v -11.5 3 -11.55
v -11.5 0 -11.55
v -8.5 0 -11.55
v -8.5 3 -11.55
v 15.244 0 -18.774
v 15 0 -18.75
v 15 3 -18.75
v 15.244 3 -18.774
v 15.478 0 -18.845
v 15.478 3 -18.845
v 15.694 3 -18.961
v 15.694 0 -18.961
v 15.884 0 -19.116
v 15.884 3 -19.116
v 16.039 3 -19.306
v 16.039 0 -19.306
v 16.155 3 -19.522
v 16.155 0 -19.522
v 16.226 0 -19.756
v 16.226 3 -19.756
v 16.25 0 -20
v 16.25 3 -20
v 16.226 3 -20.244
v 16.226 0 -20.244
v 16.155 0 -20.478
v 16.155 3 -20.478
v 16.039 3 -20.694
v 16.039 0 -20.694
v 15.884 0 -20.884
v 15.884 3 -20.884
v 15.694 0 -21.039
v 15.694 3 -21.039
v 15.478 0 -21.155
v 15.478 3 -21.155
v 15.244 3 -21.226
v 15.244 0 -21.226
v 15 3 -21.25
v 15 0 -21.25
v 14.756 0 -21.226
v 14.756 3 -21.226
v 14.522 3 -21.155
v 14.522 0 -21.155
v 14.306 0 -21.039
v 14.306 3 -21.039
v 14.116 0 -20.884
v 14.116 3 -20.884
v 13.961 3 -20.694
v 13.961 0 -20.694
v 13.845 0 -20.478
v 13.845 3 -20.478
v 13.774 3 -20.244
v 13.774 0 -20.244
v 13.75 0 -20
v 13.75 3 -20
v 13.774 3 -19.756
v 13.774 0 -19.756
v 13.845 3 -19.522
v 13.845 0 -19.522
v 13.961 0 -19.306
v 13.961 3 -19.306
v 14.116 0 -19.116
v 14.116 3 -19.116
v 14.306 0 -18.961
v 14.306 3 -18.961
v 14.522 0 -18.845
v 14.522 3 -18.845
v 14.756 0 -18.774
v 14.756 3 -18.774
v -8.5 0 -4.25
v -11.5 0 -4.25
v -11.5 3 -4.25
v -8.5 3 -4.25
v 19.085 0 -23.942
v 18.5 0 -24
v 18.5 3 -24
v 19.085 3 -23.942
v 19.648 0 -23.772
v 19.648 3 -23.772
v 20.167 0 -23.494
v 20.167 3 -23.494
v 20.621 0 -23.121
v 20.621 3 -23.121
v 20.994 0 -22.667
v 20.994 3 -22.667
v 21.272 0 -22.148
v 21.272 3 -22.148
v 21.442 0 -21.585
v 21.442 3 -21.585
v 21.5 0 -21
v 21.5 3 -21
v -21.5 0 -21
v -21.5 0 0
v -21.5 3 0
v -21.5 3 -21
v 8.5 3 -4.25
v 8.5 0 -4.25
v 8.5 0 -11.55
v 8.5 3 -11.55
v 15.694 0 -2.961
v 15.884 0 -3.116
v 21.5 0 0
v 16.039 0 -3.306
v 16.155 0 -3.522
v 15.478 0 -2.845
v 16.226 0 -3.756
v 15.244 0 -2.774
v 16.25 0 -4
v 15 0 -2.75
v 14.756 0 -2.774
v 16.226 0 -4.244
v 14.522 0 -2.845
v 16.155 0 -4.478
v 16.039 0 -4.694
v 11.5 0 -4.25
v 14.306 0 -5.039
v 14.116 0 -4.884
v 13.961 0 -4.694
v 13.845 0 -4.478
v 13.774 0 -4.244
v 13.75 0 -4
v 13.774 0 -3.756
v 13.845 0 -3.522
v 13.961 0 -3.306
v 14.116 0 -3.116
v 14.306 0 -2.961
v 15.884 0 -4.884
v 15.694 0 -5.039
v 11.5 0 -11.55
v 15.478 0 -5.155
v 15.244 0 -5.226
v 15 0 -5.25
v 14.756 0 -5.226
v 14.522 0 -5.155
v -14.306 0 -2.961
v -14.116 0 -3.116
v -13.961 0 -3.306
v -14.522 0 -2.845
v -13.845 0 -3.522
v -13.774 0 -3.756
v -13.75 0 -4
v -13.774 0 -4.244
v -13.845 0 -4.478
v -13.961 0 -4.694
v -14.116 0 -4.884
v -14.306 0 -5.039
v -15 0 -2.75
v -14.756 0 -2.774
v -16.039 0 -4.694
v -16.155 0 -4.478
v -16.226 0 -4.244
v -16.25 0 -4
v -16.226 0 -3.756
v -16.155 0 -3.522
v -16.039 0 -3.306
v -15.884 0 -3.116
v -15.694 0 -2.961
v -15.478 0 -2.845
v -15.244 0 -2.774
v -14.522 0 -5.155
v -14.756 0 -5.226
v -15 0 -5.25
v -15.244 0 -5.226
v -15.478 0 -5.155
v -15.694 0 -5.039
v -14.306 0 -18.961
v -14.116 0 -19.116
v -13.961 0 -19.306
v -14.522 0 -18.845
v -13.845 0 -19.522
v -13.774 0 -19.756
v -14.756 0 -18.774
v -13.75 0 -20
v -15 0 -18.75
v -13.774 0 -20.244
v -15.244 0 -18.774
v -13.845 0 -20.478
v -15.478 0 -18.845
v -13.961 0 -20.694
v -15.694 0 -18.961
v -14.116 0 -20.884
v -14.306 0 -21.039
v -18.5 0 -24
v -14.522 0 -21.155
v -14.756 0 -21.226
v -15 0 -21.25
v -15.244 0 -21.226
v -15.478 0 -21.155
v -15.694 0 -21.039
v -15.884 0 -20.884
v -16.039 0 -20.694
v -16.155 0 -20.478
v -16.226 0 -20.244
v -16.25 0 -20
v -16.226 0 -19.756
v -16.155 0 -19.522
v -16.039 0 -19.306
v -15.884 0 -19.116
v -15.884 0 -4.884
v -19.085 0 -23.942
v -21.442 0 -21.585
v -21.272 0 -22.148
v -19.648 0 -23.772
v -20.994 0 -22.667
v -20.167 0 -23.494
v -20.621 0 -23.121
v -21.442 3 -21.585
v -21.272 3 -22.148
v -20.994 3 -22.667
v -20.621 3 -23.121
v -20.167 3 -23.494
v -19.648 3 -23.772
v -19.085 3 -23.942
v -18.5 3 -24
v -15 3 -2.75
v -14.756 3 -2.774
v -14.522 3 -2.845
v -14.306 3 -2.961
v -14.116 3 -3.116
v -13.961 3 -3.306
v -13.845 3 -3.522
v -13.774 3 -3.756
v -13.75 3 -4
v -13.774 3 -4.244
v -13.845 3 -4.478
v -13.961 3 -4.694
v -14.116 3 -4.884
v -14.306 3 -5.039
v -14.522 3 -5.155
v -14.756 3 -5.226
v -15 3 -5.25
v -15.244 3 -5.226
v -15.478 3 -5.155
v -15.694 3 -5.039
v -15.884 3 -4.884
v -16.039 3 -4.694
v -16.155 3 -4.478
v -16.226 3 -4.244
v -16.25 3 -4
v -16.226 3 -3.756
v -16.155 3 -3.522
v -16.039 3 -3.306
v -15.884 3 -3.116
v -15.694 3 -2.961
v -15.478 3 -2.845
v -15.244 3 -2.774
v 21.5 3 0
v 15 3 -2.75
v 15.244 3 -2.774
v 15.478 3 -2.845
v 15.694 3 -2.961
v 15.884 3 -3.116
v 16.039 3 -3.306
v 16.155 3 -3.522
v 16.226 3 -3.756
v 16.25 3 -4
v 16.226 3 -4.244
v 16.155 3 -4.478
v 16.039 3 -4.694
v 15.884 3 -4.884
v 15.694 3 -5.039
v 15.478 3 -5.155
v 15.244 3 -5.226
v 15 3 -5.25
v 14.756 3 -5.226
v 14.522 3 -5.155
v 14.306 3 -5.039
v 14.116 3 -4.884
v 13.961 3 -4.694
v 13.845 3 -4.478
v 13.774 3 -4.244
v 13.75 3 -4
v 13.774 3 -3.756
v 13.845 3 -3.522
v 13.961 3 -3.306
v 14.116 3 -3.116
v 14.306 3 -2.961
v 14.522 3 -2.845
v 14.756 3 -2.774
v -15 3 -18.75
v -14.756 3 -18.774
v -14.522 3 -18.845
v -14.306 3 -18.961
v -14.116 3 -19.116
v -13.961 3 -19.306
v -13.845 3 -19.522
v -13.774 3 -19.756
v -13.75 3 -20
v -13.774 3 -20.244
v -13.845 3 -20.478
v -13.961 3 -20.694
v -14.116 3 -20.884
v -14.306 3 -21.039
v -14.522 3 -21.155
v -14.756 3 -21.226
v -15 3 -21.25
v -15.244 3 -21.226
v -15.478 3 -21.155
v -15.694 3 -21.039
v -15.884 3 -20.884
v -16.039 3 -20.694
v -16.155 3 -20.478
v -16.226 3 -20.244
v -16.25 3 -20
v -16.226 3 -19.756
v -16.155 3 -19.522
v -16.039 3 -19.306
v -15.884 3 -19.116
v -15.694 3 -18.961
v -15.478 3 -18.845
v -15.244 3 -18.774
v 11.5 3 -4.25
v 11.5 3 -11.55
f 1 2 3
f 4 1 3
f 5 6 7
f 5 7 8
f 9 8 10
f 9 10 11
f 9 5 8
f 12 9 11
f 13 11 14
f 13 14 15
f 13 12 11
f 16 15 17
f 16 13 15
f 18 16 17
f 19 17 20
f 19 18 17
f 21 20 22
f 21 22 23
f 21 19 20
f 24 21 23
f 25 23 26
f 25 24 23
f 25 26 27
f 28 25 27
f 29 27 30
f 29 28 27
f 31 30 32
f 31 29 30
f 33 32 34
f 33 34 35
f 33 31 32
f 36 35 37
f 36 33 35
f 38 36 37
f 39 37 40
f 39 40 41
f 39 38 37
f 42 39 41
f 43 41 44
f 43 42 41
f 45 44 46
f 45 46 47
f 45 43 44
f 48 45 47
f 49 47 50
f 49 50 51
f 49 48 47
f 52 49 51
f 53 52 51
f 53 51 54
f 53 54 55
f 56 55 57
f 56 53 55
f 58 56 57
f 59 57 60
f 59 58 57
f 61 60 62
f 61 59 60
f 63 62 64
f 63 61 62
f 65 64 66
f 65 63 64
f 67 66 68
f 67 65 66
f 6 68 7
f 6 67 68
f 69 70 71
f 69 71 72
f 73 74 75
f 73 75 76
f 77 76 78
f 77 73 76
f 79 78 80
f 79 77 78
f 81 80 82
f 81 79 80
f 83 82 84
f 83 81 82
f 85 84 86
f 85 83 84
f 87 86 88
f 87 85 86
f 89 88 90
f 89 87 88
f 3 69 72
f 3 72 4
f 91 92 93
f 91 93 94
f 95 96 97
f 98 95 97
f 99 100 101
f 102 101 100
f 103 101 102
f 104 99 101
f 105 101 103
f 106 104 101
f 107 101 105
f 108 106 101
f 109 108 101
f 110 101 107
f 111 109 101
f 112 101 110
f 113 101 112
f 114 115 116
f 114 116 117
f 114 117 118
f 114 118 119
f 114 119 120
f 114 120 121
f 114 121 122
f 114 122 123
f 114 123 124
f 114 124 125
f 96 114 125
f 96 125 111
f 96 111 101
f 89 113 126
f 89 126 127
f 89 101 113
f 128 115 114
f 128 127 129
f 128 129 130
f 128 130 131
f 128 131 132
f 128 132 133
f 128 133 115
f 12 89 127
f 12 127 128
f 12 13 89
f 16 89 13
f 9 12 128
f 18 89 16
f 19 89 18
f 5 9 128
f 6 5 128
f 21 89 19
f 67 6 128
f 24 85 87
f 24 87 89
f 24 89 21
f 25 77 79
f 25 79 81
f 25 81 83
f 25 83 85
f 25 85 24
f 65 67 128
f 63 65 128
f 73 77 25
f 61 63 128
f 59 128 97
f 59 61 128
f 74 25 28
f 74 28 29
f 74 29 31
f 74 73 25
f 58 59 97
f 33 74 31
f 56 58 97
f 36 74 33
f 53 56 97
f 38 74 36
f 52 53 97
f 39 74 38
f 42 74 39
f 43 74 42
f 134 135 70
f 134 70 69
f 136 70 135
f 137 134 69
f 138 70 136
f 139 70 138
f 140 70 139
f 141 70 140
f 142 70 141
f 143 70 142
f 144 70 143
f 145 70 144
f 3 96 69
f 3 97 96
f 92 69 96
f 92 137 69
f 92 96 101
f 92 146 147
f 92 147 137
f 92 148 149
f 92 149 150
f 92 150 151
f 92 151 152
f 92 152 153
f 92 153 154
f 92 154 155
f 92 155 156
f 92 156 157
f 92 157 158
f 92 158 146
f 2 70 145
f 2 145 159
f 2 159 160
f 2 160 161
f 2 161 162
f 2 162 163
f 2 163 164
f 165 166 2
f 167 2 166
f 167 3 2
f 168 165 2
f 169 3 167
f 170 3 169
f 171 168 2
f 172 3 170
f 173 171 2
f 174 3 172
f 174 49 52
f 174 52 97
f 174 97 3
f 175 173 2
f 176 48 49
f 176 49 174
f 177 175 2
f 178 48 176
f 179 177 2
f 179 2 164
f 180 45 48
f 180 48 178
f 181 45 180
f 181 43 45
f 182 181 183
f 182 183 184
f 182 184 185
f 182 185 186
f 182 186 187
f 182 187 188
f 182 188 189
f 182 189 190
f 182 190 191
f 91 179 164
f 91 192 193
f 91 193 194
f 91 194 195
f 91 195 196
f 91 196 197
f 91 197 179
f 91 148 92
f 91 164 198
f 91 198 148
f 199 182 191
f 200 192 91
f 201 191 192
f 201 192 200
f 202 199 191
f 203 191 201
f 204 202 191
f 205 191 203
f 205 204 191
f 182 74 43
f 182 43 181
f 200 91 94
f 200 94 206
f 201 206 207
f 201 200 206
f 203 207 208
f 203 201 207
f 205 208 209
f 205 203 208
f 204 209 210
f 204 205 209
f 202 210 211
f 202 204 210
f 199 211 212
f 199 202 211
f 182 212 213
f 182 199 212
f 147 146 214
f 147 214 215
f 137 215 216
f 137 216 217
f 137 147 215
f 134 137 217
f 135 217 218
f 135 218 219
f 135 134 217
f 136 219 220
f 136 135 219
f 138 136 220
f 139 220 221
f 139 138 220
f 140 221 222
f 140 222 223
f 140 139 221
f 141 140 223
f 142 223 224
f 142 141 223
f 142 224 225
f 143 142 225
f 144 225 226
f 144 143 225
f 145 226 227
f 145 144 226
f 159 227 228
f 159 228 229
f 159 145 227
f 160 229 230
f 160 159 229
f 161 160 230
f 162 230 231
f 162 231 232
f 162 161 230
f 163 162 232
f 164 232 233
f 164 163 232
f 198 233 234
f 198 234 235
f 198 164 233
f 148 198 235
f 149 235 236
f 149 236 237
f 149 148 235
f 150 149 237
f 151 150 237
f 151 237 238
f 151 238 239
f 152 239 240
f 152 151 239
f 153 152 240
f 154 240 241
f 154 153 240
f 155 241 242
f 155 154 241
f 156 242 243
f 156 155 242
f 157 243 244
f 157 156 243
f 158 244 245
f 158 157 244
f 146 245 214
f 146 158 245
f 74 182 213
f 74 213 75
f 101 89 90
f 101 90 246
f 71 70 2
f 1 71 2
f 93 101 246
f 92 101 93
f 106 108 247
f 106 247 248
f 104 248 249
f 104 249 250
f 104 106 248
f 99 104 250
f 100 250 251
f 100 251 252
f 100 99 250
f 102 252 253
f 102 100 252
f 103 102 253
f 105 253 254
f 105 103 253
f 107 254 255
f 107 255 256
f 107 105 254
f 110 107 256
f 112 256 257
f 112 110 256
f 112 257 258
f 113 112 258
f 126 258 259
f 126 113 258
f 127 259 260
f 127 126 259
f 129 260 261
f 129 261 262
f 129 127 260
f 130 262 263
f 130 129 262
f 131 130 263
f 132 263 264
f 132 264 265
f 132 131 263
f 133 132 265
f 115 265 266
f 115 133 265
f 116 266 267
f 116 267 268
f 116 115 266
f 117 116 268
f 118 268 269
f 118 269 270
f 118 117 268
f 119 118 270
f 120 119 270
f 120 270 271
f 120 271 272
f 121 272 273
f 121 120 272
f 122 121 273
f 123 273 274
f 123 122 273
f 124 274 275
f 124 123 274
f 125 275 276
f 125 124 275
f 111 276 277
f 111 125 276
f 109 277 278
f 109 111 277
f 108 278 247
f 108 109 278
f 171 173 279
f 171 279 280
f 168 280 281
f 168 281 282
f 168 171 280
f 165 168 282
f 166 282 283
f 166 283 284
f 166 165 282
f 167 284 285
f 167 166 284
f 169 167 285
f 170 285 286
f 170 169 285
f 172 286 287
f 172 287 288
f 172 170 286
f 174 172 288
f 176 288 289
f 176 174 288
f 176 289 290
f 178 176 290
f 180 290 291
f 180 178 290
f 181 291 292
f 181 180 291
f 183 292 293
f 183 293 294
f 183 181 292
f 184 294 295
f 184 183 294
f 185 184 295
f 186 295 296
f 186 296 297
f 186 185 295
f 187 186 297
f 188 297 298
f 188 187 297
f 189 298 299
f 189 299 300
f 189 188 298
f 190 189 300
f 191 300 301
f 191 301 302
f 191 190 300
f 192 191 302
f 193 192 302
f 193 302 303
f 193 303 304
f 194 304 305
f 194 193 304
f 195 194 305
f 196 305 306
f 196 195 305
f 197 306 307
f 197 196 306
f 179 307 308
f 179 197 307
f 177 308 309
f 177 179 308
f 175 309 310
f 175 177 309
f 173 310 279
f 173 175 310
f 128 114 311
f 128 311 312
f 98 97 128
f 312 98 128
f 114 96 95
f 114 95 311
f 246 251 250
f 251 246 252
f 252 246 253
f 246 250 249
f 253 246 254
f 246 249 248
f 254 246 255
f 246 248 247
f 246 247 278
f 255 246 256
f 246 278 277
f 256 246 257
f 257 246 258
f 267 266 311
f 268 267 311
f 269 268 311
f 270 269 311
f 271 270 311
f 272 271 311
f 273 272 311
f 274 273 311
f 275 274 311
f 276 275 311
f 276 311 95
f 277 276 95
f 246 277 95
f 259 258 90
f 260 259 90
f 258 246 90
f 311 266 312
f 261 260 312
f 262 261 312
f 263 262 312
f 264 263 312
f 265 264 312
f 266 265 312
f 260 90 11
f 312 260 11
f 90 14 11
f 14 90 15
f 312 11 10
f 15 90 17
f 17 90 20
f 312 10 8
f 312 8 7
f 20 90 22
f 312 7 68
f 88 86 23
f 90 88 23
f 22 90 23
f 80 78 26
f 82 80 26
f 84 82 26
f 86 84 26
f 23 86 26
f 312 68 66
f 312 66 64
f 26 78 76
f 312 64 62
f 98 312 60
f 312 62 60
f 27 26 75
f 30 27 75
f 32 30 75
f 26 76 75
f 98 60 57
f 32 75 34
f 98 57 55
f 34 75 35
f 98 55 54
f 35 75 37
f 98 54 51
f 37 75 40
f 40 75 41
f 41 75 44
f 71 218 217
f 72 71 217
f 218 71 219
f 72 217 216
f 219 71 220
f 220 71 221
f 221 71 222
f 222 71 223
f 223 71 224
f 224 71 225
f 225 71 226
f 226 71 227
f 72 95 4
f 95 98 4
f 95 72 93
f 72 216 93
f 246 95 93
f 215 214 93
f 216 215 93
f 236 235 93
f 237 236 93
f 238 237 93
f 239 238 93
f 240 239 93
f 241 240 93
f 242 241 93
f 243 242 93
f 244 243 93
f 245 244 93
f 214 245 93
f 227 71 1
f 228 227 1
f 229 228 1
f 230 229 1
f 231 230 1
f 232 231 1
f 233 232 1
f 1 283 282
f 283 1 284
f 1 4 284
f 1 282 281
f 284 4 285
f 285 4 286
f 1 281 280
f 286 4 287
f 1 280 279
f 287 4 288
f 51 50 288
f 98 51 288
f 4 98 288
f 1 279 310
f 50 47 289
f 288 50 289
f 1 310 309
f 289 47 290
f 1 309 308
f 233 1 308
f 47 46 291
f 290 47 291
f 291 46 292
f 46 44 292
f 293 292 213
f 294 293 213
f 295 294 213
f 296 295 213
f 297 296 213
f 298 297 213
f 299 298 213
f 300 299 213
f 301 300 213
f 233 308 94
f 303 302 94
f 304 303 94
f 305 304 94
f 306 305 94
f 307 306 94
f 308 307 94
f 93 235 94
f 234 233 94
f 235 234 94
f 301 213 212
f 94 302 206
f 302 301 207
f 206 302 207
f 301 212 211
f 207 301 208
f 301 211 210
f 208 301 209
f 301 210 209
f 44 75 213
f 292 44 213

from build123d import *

# Parameters (mm, degrees)
ESQUISSE1_R        = 1.25
ESQUISSE1_W        = 3
ESQUISSE1_H        = 7.3
BOSS_EXTRU_1_DEPTH = 3


with BuildPart() as part:
    # Esquisse1 → Boss.-Extru.1 (new body)
    with BuildSketch(Plane(origin=(0, 0, 0), x_dir=(1, 0, 0), z_dir=(0, 1, 0))):
        with BuildLine():
            Line((-18.5, 24), (18.5, 24))
            ThreePointArc((18.5, 24), (20.621320344, 23.121320344), (21.5, 21))
            Line((21.5, 21), (21.5, 0))
            Line((21.5, 0), (-21.5, 0))
            Line((-21.5, 0), (-21.5, 21))
            ThreePointArc((-21.5, 21), (-20.621320344, 23.121320344), (-18.5, 24))
        make_face()
        with Locations(Location((-15, 20, 0), (0, 0, 270))):
            Circle(ESQUISSE1_R, mode=Mode.SUBTRACT)
        with Locations(Location((15, 20, 0), (0, 0, 270))):
            Circle(ESQUISSE1_R, mode=Mode.SUBTRACT)
        with Locations(Location((15, 4, 0), (0, 0, 270))):
            Circle(ESQUISSE1_R, mode=Mode.SUBTRACT)
        with Locations(Location((-15, 4, 0), (0, 0, 270))):
            Circle(ESQUISSE1_R, mode=Mode.SUBTRACT)
        with Locations((-10, 7.9)):
            Rectangle(ESQUISSE1_W, ESQUISSE1_H, mode=Mode.SUBTRACT)
        with Locations((10, 7.9)):
            Rectangle(ESQUISSE1_W, ESQUISSE1_H, mode=Mode.SUBTRACT)
    extrude(amount=BOSS_EXTRU_1_DEPTH)


solid = part.part
